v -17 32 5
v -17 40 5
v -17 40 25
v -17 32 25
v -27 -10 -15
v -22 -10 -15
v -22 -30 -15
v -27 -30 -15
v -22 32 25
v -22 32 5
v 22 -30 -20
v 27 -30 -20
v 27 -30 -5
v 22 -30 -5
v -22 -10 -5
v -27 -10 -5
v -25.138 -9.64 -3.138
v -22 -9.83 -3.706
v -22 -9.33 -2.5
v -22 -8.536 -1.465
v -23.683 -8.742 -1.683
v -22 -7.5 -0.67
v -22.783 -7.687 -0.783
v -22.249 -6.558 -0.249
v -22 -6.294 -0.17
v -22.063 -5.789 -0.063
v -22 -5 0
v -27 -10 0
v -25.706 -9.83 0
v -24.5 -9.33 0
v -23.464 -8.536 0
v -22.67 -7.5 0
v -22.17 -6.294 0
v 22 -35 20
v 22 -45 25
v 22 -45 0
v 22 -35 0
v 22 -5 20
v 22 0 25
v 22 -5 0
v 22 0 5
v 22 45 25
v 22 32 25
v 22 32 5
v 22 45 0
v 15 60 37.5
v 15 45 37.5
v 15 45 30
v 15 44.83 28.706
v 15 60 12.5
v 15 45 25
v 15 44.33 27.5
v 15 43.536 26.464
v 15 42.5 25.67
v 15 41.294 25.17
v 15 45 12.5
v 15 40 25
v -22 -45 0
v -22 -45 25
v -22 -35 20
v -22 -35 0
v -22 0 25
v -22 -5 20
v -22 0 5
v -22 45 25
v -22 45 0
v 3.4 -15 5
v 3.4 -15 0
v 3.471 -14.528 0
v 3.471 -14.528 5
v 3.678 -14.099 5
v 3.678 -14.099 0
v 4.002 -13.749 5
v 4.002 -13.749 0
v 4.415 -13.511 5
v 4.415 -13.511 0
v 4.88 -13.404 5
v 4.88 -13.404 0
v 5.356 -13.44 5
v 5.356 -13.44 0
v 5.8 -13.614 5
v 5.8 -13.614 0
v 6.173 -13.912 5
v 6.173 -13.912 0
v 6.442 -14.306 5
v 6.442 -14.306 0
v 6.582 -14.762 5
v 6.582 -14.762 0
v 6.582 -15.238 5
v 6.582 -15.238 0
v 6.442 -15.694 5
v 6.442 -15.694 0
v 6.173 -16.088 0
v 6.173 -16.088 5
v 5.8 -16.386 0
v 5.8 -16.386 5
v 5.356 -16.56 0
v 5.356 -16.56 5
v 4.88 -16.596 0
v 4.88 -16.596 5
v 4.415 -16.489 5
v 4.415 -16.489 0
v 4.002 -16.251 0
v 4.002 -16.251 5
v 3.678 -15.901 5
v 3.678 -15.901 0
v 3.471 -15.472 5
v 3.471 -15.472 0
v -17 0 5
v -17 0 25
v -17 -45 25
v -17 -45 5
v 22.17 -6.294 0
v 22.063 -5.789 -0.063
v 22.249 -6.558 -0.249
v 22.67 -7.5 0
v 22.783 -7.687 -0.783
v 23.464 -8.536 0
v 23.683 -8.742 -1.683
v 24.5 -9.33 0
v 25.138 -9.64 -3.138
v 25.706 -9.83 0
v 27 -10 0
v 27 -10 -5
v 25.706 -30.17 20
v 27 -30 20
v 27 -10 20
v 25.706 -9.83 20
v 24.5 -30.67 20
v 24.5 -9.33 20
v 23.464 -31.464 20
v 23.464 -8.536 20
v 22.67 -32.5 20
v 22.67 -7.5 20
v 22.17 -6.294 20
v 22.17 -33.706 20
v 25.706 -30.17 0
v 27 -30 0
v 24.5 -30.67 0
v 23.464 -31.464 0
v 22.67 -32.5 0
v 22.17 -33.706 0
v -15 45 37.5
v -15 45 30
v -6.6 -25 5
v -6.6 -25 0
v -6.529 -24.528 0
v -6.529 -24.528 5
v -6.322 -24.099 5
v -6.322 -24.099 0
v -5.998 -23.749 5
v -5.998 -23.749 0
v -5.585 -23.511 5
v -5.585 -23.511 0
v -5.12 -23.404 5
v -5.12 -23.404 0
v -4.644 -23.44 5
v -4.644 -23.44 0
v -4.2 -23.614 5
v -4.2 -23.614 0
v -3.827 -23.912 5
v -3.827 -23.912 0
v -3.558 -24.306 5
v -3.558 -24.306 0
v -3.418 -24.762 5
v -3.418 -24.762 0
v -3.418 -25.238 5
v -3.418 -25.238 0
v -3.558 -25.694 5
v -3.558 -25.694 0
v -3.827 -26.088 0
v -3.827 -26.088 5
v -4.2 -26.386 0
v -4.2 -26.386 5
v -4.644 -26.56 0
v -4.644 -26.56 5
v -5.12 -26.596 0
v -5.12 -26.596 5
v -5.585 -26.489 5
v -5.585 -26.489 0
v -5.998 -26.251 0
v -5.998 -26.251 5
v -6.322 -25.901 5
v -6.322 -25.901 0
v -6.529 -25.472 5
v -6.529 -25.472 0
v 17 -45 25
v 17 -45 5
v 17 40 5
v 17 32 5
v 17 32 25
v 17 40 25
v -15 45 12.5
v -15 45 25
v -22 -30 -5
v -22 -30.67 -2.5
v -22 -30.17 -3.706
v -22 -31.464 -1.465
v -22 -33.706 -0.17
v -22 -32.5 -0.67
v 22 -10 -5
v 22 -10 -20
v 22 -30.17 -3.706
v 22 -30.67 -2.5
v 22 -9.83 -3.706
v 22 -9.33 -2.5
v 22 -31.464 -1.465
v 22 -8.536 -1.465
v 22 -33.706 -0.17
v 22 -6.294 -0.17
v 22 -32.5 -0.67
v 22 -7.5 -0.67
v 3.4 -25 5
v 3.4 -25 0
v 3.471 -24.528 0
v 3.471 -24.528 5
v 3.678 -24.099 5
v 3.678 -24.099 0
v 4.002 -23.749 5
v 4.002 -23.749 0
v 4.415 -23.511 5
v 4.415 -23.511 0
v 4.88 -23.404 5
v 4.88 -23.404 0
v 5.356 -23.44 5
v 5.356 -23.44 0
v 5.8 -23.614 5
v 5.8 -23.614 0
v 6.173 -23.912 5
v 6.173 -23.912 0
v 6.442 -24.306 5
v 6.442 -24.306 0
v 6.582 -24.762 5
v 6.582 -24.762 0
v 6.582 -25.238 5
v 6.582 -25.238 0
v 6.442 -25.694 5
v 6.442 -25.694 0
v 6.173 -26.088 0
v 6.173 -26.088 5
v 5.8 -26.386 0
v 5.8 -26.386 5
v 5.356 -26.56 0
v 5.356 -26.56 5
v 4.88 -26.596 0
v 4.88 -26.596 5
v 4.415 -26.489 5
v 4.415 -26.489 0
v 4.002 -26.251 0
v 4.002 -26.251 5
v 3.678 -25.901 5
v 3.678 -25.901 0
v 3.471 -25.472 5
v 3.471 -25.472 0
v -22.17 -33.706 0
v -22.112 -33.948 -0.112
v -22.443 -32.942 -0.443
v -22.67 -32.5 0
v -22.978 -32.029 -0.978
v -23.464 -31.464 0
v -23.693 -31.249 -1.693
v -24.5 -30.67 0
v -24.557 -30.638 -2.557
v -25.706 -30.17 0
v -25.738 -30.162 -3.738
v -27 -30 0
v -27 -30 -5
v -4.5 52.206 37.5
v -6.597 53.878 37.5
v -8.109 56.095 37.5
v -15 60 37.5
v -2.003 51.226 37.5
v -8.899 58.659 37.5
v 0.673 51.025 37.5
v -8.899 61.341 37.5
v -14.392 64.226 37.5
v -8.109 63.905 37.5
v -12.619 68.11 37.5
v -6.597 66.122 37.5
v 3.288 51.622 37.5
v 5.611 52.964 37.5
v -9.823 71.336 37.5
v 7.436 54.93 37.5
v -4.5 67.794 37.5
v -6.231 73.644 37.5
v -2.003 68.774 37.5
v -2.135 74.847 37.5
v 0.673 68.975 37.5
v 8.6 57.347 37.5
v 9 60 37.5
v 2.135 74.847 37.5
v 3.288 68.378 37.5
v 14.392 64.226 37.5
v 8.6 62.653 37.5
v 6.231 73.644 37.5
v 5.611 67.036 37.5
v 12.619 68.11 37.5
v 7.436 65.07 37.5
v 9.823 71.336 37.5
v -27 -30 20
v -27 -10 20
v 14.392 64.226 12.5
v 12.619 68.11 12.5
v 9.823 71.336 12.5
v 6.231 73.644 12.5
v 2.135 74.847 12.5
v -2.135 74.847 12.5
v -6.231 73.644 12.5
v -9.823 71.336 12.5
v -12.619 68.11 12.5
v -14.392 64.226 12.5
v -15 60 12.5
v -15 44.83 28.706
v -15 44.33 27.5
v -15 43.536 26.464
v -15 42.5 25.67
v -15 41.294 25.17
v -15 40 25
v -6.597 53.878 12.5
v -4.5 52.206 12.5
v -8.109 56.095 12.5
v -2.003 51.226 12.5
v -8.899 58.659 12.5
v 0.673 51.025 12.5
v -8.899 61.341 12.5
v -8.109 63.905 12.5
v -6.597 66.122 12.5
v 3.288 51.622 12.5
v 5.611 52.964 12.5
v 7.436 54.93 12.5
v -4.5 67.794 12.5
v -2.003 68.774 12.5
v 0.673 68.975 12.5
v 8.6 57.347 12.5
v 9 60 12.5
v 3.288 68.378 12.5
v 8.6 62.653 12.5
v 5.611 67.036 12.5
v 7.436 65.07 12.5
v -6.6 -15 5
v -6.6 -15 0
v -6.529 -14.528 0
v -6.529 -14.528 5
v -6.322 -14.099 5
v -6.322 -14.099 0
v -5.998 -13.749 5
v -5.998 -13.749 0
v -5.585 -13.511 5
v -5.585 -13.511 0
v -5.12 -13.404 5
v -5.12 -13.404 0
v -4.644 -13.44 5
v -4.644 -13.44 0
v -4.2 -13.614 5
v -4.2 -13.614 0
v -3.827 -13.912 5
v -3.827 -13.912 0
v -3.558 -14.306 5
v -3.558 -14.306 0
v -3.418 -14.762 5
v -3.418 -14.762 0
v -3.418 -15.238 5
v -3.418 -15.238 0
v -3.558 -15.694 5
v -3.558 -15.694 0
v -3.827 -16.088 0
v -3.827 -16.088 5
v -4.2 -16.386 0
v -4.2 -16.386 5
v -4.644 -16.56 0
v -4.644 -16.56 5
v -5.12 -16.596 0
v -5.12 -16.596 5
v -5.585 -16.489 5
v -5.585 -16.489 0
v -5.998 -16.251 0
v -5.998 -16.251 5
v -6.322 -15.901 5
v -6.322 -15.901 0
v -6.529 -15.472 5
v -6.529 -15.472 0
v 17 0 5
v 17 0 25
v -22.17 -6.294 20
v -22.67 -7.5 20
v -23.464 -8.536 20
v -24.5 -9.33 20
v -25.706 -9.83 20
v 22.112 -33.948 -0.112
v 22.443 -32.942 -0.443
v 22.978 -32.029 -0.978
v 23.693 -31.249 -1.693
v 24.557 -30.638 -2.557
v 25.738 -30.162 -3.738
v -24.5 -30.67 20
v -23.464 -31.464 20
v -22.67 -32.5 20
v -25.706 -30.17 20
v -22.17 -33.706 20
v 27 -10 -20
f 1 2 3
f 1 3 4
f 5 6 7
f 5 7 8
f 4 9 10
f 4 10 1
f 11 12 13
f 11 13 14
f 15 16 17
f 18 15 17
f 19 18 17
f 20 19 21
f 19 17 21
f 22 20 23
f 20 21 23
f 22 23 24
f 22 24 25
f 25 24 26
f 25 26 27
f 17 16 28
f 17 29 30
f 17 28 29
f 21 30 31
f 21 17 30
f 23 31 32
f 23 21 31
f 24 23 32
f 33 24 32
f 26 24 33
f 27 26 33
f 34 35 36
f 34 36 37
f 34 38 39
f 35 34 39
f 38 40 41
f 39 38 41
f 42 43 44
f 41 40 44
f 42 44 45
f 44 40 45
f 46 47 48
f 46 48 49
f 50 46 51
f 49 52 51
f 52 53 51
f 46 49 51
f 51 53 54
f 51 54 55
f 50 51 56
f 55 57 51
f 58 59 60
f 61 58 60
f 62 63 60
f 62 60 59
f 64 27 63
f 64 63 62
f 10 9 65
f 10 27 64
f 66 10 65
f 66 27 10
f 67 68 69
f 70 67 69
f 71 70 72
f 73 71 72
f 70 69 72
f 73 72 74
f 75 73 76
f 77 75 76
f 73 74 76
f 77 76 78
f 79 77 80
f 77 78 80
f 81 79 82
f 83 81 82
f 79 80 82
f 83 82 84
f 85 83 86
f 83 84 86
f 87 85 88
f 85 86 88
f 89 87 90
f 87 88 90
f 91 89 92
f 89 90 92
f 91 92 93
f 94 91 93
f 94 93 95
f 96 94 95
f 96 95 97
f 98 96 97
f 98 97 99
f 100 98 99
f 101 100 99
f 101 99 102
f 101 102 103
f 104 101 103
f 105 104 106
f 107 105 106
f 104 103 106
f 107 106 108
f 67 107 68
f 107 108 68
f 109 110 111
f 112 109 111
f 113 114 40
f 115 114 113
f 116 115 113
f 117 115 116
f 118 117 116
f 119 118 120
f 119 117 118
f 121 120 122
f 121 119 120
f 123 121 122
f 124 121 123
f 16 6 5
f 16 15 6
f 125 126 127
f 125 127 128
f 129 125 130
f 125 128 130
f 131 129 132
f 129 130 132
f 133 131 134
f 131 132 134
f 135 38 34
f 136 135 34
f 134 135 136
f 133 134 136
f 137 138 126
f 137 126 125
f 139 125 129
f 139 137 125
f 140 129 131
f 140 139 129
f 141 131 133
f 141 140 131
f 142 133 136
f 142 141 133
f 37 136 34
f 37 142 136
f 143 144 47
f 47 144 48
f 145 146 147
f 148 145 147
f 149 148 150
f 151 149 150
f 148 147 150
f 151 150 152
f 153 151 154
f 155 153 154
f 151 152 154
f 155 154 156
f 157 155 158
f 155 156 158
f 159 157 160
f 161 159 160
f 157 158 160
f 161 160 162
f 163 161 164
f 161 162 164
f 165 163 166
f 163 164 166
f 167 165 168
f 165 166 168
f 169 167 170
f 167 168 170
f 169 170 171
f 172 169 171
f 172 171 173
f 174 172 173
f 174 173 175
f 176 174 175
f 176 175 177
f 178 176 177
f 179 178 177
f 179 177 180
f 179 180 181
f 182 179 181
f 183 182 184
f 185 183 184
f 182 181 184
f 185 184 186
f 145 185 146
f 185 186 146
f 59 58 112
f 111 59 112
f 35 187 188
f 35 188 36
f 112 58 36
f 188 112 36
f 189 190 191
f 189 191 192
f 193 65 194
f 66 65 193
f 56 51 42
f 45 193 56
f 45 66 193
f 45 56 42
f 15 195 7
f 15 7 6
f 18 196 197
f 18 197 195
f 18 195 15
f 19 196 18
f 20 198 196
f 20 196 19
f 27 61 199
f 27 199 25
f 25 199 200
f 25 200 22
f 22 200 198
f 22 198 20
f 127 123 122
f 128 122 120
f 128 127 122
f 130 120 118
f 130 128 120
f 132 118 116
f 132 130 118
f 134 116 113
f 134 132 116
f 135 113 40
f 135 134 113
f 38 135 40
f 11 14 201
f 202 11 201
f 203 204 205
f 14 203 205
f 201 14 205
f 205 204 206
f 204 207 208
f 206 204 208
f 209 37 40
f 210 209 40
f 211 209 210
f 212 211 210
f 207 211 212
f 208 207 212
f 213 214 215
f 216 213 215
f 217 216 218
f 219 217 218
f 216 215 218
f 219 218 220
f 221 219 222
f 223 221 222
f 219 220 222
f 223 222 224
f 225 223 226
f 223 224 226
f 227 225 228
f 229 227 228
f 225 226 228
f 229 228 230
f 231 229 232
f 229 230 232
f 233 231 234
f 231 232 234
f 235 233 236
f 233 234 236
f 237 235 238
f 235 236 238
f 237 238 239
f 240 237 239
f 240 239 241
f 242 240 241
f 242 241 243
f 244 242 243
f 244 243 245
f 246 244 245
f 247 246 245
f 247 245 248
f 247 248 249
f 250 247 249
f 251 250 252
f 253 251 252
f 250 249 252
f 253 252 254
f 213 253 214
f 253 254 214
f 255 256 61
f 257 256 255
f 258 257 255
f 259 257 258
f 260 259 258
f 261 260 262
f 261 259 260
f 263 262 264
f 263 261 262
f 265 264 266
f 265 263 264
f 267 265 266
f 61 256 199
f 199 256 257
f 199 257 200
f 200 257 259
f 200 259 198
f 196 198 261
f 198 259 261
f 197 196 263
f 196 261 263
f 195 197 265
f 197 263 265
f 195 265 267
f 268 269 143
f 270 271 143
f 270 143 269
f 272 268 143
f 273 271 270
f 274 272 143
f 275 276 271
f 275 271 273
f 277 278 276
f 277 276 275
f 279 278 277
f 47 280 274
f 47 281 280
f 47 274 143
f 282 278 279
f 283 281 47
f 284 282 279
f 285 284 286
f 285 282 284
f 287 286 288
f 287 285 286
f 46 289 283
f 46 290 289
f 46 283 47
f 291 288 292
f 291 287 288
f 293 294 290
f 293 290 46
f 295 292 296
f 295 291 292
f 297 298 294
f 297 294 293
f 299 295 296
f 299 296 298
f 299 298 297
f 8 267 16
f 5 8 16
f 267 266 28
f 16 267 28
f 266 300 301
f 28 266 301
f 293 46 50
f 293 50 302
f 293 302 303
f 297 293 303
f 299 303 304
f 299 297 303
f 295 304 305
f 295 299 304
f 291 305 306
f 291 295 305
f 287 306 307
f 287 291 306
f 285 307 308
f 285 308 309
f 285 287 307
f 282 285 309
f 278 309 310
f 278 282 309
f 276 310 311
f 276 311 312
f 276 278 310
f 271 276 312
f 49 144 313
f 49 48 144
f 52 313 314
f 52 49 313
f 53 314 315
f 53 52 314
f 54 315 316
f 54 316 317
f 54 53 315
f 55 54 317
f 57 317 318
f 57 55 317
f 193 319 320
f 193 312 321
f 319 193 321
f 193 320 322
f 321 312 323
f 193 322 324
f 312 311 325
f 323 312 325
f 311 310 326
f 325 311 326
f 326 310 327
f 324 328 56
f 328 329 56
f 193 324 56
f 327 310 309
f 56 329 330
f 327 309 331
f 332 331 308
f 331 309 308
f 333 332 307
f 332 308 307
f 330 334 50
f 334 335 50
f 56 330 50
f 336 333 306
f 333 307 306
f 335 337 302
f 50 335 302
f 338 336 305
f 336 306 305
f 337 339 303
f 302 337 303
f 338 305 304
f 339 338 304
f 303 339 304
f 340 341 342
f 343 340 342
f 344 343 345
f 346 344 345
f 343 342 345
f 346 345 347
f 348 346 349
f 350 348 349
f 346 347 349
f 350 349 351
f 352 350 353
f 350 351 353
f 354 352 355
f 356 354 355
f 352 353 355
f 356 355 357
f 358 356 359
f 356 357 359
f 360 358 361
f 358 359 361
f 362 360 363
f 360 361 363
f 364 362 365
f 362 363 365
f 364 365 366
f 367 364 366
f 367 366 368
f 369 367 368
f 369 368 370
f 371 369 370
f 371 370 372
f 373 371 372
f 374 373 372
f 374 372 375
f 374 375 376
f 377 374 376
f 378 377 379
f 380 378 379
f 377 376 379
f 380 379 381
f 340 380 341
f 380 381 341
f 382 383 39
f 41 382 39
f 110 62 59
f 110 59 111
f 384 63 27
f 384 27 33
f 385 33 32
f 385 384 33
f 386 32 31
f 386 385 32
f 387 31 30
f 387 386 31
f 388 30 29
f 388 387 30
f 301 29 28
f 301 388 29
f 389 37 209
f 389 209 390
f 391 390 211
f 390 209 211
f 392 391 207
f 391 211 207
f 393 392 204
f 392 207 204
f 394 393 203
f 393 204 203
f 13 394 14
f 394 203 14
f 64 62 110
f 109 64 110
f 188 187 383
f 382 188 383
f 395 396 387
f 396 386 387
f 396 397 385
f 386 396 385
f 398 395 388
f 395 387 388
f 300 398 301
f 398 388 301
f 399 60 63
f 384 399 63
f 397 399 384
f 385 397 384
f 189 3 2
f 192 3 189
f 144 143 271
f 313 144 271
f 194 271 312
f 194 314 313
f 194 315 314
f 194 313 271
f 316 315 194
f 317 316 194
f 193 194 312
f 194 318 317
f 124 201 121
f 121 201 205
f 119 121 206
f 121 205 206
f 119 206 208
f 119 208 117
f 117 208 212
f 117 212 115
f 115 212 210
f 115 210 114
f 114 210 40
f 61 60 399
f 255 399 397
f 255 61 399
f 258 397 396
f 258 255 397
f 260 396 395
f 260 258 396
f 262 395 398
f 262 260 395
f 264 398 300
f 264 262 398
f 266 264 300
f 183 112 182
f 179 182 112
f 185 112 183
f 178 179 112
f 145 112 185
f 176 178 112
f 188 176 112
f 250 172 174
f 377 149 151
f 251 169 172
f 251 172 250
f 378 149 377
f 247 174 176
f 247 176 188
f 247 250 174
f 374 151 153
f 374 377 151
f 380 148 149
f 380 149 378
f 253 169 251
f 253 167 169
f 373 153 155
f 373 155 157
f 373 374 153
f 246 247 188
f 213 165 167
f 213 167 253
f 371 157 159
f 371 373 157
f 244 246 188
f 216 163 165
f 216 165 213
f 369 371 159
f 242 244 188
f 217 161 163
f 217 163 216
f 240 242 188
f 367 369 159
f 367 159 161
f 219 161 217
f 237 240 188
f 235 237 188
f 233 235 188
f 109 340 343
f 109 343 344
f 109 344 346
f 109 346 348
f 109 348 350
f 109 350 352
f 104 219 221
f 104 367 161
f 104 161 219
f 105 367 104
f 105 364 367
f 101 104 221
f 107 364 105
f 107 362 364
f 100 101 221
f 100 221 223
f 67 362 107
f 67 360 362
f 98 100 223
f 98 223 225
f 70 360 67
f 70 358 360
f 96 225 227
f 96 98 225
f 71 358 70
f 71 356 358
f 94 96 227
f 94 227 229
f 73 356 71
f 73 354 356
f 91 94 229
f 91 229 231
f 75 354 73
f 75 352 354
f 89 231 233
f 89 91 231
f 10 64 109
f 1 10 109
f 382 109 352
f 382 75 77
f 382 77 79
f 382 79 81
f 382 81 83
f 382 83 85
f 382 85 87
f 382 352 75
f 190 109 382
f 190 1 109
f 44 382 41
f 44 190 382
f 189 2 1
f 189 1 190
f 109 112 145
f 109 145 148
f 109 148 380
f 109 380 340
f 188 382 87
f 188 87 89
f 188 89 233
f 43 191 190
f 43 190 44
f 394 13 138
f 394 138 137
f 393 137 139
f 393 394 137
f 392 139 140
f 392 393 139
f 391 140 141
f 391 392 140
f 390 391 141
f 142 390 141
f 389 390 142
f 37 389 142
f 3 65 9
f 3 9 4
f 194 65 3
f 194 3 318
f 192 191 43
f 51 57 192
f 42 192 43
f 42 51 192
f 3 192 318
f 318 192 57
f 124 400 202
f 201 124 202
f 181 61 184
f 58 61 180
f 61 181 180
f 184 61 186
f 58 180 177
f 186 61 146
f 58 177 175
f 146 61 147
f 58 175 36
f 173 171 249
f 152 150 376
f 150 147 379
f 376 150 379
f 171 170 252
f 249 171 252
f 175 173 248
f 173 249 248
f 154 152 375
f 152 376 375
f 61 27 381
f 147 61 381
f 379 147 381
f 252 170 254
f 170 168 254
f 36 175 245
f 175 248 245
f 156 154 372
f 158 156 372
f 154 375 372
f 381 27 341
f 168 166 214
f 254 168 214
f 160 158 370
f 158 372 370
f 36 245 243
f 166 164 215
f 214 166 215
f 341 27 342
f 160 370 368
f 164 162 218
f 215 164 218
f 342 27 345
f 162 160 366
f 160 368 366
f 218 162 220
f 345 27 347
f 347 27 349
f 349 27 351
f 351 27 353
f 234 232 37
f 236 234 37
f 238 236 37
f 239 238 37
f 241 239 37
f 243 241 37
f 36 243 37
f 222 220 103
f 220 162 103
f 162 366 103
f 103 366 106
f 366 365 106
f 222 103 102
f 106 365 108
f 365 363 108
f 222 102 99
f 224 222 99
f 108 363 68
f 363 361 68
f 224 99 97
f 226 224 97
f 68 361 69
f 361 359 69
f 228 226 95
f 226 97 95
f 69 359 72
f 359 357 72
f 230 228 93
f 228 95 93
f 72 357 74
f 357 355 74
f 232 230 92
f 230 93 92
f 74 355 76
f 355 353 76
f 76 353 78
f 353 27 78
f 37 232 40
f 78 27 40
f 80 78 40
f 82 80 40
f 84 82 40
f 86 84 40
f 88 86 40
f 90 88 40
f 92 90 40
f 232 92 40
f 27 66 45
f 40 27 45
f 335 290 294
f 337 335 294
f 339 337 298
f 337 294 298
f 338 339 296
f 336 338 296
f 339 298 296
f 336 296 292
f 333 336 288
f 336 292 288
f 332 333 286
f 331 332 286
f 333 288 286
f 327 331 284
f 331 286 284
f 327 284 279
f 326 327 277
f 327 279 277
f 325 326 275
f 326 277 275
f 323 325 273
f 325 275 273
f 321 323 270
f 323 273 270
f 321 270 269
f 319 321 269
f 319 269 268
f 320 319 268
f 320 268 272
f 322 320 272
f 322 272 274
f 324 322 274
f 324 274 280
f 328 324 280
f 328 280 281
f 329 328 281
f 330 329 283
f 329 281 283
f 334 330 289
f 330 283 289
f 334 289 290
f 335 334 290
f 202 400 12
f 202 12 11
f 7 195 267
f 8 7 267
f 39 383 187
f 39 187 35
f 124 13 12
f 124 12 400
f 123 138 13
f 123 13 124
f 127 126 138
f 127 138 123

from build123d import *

# Parameters (mm, degrees)
SKETCH_1_W          = 44
SKETCH_1_H          = 90
EXTRUDE_1_DEPTH     = 25
CUT_EXTRUDE_1_DEPTH = 20
SKETCH_3_W          = 5
SKETCH_3_H          = 20
EXTRUDE_2_DEPTH     = 20
FILLET_1_R          = 5
FILLET_START        = -22.5281
FILLET_3_DEPTH      = 0.5281
FILLET_START_2      = 22
FILLET_3_2_DEPTH    = 0.5137
FILLET_START_3      = 22.5137
FILLET_3_3_DEPTH    = 4.4863
FILLET_START_4      = -27
FILLET_3_4_DEPTH    = 4.4719
FILLET_START_5      = -20
FILLET_3_5_DEPTH    = 20
SKETCH_4_W          = 30
SKETCH_4_H          = 25
EXTRUDE_3_DEPTH     = 15
SKETCH_5_R          = 15
EXTRUDE_4_DEPTH     = 25
SKETCH_6_R          = 9
CUT_EXTRUDE_2_DEPTH = 25
FILLET_4_R          = 5
SKETCH_7_W          = 76.334334434
SKETCH_7_H          = 32
CUT_EXTRUDE_3_DEPTH = 20
SKETCH_9_W          = 10
SKETCH_9_H          = 40
CUT_EXTRUDE_5_DEPTH = 5
SKETCH_10_R         = 1.6
CUT_EXTRUDE_6_DEPTH = 5


with BuildPart() as part:
    # 草图1 → 凸台-拉伸1 (new body)
    with BuildSketch(Plane.XY):
        Rectangle(SKETCH_1_W, SKETCH_1_H)
    extrude(amount=EXTRUDE_1_DEPTH)

    # 草图2 → 切除-拉伸1 (cut)
    with BuildSketch(Plane.XY.offset(25)):
        Polygon((-17, 40), (17, 40), (17, -40), (17, -54.466657213), (-17, -54.466657213), (-17, -40), align=None)
    extrude(amount=-CUT_EXTRUDE_1_DEPTH, mode=Mode.SUBTRACT)

    # 草图3 → 凸台-拉伸2 (add, symmetric)
    with BuildSketch(Plane(origin=(0, 0, 0), x_dir=(-1, 0, 0), z_dir=(0, 0, -1))):
        with Locations((24.5, -20)):
            Rectangle(SKETCH_3_W, SKETCH_3_H)
        with Locations((-24.5, -20)):
            Rectangle(SKETCH_3_W, SKETCH_3_H)
    extrude(amount=EXTRUDE_2_DEPTH, both=True)

    # 圆角1
    fillet_1_edges = [part.edges().sort_by_distance(p)[0] for p in [
        (22, -30, 10),
        (-22, -30, 10),
        (-22, -10, 10),
        (22, -10, 10),
    ]]
    fillet(fillet_1_edges, radius=FILLET_1_R - 0.0001)  # a hair under: the kernel refuses the full size

    # 圆角3: read off the stored shape, not the designer's step
    # 圆角3 outline → 圆角3 (add)
    with BuildSketch(Plane.YZ.offset(FILLET_START)):
        with BuildLine():
            Line((-5, 0), (-10, 0))
            Line((-10, 0), (-10, -5))
            ThreePointArc((-10, -5), (-8.535533906, -1.464466094), (-5, 0))
        make_face()
        with BuildLine():
            ThreePointArc((-35, 0), (-31.464466094, -1.464466094), (-30, -5))
            Line((-30, -5), (-30, 0))
            Line((-30, 0), (-35, 0))
        make_face()
    extrude(amount=FILLET_3_DEPTH)

    # Fillet 3 2 outline → Fillet 3 2 (add)
    with BuildSketch(Plane.YZ.offset(FILLET_START_2)):
        with BuildLine():
            Line((-5, 0), (-10, 0))
            Line((-10, 0), (-10, -5))
            ThreePointArc((-10, -5), (-8.535533906, -1.464466094), (-5, 0))
        make_face()
        with BuildLine():
            ThreePointArc((-35, 0), (-31.464466094, -1.464466094), (-30, -5))
            Line((-30, -5), (-30, 0))
            Line((-30, 0), (-35, 0))
        make_face()
    extrude(amount=FILLET_3_2_DEPTH)

    # Fillet 3 3 outline → Fillet 3 3 (add)
    with BuildSketch(Plane.YZ.offset(FILLET_START_3)):
        with BuildLine():
            ThreePointArc((-35, 0), (-31.464466094, -1.464466094), (-30, -5))
            Line((-30, -5), (-30, 0))
            Line((-30, 0), (-35, 0))
        make_face()
        with BuildLine():
            Line((-10, 0), (-10, -5))
            ThreePointArc((-10, -5), (-8.535533906, -1.464466094), (-5, 0))
            Line((-5, 0), (-10, 0))
        make_face()
    extrude(amount=FILLET_3_3_DEPTH)

    # Fillet 3 4 outline → Fillet 3 4 (add)
    with BuildSketch(Plane.YZ.offset(FILLET_START_4)):
        with BuildLine():
            ThreePointArc((-35, 0), (-31.464466094, -1.464466094), (-30, -5))
            Line((-30, -5), (-30, 0))
            Line((-30, 0), (-35, 0))
        make_face()
        with BuildLine():
            Line((-10, 0), (-10, -5))
            ThreePointArc((-10, -5), (-8.535533906, -1.464466094), (-5, 0))
            Line((-5, 0), (-10, 0))
        make_face()
    extrude(amount=FILLET_3_4_DEPTH)

    # Fillet 3 5 outline → Fillet 3 5 (cut)
    with BuildSketch(Plane.XY.offset(FILLET_START_5)):
        with BuildLine():
            ThreePointArc((27, -30), (23.464466094, -31.464466094), (22, -35))
            Line((22, -35), (22, -36))
            Line((22, -36), (27, -36))
            Line((27, -36), (27, -30))
        make_face()
        with BuildLine():
            ThreePointArc((22, -5), (23.464466094, -8.535533906), (27, -10))
            Line((27, -10), (27, -3))
            Line((27, -3), (22, -3))
            Line((22, -3), (22, -5))
        make_face()
        with BuildLine():
            Line((-27, -36), (-22, -36))
            Line((-22, -36), (-22, -35))
            ThreePointArc((-22, -35), (-23.464466094, -31.464466094), (-27, -30))
            Line((-27, -30), (-27, -36))
        make_face()
        with BuildLine():
            Line((-22, -5), (-22, -3))
            Line((-22, -3), (-27, -3))
            Line((-27, -3), (-27, -10))
            ThreePointArc((-27, -10), (-23.464466094, -8.535533906), (-22, -5))
        make_face()
    extrude(amount=FILLET_3_5_DEPTH, mode=Mode.SUBTRACT)

    # 草图4 → 凸台-拉伸3 (add)
    with BuildSketch(Plane(origin=(0, 45, 0), x_dir=(1, 0, 0), z_dir=(0, 1, 0))):
        with Locations((0, -25)):
            Rectangle(SKETCH_4_W, SKETCH_4_H)
    extrude(amount=EXTRUDE_3_DEPTH)

    # 草图5 → 凸台-拉伸4 (add)
    with BuildSketch(Plane.XY.offset(37.5)):
        with Locations((0, 60)):
            Circle(SKETCH_5_R)
    extrude(amount=-EXTRUDE_4_DEPTH)

    # 草图6 → 切除-拉伸2 (cut)
    with BuildSketch(Plane.XY.offset(37.5)):
        with Locations((0, 60)):
            Circle(SKETCH_6_R)
    extrude(amount=-CUT_EXTRUDE_2_DEPTH, mode=Mode.SUBTRACT)

    # 圆角4
    fillet_4_edges = [part.edges().sort_by_distance(p)[0] for p in [
        (0, 45, 25),
    ]]
    fillet(fillet_4_edges, radius=FILLET_4_R - 0.0001)  # a hair under: the kernel refuses the full size

    # 草图7 → 切除-拉伸3 (cut)
    with BuildSketch(Plane.XY.offset(25)):
        with Locations((0, 16)):
            Rectangle(SKETCH_7_W, SKETCH_7_H)
    extrude(amount=-CUT_EXTRUDE_3_DEPTH, mode=Mode.SUBTRACT)

    # 草图9 → 切除-拉伸5 (cut)
    with BuildSketch(Plane(origin=(0, 0, -20), x_dir=(-1, 0, 0), z_dir=(0, 0, -1))):
        with Locations((22, -10)):
            Rectangle(SKETCH_9_W, SKETCH_9_H)
    extrude(amount=-CUT_EXTRUDE_5_DEPTH, mode=Mode.SUBTRACT)

    # 草图10 → 切除-拉伸6 (cut)
    with BuildSketch(Plane(origin=(0, 0, 0), x_dir=(-1, 0, 0), z_dir=(0, 0, -1))):
        with Locations((5, -15)):
            Circle(SKETCH_10_R)
        with Locations((5, -25)):
            Circle(SKETCH_10_R)
        with Locations((-5, -25)):
            Circle(SKETCH_10_R)
        with Locations((-5, -15)):
            Circle(SKETCH_10_R)
    extrude(amount=-CUT_EXTRUDE_6_DEPTH, mode=Mode.SUBTRACT)


solid = part.part
